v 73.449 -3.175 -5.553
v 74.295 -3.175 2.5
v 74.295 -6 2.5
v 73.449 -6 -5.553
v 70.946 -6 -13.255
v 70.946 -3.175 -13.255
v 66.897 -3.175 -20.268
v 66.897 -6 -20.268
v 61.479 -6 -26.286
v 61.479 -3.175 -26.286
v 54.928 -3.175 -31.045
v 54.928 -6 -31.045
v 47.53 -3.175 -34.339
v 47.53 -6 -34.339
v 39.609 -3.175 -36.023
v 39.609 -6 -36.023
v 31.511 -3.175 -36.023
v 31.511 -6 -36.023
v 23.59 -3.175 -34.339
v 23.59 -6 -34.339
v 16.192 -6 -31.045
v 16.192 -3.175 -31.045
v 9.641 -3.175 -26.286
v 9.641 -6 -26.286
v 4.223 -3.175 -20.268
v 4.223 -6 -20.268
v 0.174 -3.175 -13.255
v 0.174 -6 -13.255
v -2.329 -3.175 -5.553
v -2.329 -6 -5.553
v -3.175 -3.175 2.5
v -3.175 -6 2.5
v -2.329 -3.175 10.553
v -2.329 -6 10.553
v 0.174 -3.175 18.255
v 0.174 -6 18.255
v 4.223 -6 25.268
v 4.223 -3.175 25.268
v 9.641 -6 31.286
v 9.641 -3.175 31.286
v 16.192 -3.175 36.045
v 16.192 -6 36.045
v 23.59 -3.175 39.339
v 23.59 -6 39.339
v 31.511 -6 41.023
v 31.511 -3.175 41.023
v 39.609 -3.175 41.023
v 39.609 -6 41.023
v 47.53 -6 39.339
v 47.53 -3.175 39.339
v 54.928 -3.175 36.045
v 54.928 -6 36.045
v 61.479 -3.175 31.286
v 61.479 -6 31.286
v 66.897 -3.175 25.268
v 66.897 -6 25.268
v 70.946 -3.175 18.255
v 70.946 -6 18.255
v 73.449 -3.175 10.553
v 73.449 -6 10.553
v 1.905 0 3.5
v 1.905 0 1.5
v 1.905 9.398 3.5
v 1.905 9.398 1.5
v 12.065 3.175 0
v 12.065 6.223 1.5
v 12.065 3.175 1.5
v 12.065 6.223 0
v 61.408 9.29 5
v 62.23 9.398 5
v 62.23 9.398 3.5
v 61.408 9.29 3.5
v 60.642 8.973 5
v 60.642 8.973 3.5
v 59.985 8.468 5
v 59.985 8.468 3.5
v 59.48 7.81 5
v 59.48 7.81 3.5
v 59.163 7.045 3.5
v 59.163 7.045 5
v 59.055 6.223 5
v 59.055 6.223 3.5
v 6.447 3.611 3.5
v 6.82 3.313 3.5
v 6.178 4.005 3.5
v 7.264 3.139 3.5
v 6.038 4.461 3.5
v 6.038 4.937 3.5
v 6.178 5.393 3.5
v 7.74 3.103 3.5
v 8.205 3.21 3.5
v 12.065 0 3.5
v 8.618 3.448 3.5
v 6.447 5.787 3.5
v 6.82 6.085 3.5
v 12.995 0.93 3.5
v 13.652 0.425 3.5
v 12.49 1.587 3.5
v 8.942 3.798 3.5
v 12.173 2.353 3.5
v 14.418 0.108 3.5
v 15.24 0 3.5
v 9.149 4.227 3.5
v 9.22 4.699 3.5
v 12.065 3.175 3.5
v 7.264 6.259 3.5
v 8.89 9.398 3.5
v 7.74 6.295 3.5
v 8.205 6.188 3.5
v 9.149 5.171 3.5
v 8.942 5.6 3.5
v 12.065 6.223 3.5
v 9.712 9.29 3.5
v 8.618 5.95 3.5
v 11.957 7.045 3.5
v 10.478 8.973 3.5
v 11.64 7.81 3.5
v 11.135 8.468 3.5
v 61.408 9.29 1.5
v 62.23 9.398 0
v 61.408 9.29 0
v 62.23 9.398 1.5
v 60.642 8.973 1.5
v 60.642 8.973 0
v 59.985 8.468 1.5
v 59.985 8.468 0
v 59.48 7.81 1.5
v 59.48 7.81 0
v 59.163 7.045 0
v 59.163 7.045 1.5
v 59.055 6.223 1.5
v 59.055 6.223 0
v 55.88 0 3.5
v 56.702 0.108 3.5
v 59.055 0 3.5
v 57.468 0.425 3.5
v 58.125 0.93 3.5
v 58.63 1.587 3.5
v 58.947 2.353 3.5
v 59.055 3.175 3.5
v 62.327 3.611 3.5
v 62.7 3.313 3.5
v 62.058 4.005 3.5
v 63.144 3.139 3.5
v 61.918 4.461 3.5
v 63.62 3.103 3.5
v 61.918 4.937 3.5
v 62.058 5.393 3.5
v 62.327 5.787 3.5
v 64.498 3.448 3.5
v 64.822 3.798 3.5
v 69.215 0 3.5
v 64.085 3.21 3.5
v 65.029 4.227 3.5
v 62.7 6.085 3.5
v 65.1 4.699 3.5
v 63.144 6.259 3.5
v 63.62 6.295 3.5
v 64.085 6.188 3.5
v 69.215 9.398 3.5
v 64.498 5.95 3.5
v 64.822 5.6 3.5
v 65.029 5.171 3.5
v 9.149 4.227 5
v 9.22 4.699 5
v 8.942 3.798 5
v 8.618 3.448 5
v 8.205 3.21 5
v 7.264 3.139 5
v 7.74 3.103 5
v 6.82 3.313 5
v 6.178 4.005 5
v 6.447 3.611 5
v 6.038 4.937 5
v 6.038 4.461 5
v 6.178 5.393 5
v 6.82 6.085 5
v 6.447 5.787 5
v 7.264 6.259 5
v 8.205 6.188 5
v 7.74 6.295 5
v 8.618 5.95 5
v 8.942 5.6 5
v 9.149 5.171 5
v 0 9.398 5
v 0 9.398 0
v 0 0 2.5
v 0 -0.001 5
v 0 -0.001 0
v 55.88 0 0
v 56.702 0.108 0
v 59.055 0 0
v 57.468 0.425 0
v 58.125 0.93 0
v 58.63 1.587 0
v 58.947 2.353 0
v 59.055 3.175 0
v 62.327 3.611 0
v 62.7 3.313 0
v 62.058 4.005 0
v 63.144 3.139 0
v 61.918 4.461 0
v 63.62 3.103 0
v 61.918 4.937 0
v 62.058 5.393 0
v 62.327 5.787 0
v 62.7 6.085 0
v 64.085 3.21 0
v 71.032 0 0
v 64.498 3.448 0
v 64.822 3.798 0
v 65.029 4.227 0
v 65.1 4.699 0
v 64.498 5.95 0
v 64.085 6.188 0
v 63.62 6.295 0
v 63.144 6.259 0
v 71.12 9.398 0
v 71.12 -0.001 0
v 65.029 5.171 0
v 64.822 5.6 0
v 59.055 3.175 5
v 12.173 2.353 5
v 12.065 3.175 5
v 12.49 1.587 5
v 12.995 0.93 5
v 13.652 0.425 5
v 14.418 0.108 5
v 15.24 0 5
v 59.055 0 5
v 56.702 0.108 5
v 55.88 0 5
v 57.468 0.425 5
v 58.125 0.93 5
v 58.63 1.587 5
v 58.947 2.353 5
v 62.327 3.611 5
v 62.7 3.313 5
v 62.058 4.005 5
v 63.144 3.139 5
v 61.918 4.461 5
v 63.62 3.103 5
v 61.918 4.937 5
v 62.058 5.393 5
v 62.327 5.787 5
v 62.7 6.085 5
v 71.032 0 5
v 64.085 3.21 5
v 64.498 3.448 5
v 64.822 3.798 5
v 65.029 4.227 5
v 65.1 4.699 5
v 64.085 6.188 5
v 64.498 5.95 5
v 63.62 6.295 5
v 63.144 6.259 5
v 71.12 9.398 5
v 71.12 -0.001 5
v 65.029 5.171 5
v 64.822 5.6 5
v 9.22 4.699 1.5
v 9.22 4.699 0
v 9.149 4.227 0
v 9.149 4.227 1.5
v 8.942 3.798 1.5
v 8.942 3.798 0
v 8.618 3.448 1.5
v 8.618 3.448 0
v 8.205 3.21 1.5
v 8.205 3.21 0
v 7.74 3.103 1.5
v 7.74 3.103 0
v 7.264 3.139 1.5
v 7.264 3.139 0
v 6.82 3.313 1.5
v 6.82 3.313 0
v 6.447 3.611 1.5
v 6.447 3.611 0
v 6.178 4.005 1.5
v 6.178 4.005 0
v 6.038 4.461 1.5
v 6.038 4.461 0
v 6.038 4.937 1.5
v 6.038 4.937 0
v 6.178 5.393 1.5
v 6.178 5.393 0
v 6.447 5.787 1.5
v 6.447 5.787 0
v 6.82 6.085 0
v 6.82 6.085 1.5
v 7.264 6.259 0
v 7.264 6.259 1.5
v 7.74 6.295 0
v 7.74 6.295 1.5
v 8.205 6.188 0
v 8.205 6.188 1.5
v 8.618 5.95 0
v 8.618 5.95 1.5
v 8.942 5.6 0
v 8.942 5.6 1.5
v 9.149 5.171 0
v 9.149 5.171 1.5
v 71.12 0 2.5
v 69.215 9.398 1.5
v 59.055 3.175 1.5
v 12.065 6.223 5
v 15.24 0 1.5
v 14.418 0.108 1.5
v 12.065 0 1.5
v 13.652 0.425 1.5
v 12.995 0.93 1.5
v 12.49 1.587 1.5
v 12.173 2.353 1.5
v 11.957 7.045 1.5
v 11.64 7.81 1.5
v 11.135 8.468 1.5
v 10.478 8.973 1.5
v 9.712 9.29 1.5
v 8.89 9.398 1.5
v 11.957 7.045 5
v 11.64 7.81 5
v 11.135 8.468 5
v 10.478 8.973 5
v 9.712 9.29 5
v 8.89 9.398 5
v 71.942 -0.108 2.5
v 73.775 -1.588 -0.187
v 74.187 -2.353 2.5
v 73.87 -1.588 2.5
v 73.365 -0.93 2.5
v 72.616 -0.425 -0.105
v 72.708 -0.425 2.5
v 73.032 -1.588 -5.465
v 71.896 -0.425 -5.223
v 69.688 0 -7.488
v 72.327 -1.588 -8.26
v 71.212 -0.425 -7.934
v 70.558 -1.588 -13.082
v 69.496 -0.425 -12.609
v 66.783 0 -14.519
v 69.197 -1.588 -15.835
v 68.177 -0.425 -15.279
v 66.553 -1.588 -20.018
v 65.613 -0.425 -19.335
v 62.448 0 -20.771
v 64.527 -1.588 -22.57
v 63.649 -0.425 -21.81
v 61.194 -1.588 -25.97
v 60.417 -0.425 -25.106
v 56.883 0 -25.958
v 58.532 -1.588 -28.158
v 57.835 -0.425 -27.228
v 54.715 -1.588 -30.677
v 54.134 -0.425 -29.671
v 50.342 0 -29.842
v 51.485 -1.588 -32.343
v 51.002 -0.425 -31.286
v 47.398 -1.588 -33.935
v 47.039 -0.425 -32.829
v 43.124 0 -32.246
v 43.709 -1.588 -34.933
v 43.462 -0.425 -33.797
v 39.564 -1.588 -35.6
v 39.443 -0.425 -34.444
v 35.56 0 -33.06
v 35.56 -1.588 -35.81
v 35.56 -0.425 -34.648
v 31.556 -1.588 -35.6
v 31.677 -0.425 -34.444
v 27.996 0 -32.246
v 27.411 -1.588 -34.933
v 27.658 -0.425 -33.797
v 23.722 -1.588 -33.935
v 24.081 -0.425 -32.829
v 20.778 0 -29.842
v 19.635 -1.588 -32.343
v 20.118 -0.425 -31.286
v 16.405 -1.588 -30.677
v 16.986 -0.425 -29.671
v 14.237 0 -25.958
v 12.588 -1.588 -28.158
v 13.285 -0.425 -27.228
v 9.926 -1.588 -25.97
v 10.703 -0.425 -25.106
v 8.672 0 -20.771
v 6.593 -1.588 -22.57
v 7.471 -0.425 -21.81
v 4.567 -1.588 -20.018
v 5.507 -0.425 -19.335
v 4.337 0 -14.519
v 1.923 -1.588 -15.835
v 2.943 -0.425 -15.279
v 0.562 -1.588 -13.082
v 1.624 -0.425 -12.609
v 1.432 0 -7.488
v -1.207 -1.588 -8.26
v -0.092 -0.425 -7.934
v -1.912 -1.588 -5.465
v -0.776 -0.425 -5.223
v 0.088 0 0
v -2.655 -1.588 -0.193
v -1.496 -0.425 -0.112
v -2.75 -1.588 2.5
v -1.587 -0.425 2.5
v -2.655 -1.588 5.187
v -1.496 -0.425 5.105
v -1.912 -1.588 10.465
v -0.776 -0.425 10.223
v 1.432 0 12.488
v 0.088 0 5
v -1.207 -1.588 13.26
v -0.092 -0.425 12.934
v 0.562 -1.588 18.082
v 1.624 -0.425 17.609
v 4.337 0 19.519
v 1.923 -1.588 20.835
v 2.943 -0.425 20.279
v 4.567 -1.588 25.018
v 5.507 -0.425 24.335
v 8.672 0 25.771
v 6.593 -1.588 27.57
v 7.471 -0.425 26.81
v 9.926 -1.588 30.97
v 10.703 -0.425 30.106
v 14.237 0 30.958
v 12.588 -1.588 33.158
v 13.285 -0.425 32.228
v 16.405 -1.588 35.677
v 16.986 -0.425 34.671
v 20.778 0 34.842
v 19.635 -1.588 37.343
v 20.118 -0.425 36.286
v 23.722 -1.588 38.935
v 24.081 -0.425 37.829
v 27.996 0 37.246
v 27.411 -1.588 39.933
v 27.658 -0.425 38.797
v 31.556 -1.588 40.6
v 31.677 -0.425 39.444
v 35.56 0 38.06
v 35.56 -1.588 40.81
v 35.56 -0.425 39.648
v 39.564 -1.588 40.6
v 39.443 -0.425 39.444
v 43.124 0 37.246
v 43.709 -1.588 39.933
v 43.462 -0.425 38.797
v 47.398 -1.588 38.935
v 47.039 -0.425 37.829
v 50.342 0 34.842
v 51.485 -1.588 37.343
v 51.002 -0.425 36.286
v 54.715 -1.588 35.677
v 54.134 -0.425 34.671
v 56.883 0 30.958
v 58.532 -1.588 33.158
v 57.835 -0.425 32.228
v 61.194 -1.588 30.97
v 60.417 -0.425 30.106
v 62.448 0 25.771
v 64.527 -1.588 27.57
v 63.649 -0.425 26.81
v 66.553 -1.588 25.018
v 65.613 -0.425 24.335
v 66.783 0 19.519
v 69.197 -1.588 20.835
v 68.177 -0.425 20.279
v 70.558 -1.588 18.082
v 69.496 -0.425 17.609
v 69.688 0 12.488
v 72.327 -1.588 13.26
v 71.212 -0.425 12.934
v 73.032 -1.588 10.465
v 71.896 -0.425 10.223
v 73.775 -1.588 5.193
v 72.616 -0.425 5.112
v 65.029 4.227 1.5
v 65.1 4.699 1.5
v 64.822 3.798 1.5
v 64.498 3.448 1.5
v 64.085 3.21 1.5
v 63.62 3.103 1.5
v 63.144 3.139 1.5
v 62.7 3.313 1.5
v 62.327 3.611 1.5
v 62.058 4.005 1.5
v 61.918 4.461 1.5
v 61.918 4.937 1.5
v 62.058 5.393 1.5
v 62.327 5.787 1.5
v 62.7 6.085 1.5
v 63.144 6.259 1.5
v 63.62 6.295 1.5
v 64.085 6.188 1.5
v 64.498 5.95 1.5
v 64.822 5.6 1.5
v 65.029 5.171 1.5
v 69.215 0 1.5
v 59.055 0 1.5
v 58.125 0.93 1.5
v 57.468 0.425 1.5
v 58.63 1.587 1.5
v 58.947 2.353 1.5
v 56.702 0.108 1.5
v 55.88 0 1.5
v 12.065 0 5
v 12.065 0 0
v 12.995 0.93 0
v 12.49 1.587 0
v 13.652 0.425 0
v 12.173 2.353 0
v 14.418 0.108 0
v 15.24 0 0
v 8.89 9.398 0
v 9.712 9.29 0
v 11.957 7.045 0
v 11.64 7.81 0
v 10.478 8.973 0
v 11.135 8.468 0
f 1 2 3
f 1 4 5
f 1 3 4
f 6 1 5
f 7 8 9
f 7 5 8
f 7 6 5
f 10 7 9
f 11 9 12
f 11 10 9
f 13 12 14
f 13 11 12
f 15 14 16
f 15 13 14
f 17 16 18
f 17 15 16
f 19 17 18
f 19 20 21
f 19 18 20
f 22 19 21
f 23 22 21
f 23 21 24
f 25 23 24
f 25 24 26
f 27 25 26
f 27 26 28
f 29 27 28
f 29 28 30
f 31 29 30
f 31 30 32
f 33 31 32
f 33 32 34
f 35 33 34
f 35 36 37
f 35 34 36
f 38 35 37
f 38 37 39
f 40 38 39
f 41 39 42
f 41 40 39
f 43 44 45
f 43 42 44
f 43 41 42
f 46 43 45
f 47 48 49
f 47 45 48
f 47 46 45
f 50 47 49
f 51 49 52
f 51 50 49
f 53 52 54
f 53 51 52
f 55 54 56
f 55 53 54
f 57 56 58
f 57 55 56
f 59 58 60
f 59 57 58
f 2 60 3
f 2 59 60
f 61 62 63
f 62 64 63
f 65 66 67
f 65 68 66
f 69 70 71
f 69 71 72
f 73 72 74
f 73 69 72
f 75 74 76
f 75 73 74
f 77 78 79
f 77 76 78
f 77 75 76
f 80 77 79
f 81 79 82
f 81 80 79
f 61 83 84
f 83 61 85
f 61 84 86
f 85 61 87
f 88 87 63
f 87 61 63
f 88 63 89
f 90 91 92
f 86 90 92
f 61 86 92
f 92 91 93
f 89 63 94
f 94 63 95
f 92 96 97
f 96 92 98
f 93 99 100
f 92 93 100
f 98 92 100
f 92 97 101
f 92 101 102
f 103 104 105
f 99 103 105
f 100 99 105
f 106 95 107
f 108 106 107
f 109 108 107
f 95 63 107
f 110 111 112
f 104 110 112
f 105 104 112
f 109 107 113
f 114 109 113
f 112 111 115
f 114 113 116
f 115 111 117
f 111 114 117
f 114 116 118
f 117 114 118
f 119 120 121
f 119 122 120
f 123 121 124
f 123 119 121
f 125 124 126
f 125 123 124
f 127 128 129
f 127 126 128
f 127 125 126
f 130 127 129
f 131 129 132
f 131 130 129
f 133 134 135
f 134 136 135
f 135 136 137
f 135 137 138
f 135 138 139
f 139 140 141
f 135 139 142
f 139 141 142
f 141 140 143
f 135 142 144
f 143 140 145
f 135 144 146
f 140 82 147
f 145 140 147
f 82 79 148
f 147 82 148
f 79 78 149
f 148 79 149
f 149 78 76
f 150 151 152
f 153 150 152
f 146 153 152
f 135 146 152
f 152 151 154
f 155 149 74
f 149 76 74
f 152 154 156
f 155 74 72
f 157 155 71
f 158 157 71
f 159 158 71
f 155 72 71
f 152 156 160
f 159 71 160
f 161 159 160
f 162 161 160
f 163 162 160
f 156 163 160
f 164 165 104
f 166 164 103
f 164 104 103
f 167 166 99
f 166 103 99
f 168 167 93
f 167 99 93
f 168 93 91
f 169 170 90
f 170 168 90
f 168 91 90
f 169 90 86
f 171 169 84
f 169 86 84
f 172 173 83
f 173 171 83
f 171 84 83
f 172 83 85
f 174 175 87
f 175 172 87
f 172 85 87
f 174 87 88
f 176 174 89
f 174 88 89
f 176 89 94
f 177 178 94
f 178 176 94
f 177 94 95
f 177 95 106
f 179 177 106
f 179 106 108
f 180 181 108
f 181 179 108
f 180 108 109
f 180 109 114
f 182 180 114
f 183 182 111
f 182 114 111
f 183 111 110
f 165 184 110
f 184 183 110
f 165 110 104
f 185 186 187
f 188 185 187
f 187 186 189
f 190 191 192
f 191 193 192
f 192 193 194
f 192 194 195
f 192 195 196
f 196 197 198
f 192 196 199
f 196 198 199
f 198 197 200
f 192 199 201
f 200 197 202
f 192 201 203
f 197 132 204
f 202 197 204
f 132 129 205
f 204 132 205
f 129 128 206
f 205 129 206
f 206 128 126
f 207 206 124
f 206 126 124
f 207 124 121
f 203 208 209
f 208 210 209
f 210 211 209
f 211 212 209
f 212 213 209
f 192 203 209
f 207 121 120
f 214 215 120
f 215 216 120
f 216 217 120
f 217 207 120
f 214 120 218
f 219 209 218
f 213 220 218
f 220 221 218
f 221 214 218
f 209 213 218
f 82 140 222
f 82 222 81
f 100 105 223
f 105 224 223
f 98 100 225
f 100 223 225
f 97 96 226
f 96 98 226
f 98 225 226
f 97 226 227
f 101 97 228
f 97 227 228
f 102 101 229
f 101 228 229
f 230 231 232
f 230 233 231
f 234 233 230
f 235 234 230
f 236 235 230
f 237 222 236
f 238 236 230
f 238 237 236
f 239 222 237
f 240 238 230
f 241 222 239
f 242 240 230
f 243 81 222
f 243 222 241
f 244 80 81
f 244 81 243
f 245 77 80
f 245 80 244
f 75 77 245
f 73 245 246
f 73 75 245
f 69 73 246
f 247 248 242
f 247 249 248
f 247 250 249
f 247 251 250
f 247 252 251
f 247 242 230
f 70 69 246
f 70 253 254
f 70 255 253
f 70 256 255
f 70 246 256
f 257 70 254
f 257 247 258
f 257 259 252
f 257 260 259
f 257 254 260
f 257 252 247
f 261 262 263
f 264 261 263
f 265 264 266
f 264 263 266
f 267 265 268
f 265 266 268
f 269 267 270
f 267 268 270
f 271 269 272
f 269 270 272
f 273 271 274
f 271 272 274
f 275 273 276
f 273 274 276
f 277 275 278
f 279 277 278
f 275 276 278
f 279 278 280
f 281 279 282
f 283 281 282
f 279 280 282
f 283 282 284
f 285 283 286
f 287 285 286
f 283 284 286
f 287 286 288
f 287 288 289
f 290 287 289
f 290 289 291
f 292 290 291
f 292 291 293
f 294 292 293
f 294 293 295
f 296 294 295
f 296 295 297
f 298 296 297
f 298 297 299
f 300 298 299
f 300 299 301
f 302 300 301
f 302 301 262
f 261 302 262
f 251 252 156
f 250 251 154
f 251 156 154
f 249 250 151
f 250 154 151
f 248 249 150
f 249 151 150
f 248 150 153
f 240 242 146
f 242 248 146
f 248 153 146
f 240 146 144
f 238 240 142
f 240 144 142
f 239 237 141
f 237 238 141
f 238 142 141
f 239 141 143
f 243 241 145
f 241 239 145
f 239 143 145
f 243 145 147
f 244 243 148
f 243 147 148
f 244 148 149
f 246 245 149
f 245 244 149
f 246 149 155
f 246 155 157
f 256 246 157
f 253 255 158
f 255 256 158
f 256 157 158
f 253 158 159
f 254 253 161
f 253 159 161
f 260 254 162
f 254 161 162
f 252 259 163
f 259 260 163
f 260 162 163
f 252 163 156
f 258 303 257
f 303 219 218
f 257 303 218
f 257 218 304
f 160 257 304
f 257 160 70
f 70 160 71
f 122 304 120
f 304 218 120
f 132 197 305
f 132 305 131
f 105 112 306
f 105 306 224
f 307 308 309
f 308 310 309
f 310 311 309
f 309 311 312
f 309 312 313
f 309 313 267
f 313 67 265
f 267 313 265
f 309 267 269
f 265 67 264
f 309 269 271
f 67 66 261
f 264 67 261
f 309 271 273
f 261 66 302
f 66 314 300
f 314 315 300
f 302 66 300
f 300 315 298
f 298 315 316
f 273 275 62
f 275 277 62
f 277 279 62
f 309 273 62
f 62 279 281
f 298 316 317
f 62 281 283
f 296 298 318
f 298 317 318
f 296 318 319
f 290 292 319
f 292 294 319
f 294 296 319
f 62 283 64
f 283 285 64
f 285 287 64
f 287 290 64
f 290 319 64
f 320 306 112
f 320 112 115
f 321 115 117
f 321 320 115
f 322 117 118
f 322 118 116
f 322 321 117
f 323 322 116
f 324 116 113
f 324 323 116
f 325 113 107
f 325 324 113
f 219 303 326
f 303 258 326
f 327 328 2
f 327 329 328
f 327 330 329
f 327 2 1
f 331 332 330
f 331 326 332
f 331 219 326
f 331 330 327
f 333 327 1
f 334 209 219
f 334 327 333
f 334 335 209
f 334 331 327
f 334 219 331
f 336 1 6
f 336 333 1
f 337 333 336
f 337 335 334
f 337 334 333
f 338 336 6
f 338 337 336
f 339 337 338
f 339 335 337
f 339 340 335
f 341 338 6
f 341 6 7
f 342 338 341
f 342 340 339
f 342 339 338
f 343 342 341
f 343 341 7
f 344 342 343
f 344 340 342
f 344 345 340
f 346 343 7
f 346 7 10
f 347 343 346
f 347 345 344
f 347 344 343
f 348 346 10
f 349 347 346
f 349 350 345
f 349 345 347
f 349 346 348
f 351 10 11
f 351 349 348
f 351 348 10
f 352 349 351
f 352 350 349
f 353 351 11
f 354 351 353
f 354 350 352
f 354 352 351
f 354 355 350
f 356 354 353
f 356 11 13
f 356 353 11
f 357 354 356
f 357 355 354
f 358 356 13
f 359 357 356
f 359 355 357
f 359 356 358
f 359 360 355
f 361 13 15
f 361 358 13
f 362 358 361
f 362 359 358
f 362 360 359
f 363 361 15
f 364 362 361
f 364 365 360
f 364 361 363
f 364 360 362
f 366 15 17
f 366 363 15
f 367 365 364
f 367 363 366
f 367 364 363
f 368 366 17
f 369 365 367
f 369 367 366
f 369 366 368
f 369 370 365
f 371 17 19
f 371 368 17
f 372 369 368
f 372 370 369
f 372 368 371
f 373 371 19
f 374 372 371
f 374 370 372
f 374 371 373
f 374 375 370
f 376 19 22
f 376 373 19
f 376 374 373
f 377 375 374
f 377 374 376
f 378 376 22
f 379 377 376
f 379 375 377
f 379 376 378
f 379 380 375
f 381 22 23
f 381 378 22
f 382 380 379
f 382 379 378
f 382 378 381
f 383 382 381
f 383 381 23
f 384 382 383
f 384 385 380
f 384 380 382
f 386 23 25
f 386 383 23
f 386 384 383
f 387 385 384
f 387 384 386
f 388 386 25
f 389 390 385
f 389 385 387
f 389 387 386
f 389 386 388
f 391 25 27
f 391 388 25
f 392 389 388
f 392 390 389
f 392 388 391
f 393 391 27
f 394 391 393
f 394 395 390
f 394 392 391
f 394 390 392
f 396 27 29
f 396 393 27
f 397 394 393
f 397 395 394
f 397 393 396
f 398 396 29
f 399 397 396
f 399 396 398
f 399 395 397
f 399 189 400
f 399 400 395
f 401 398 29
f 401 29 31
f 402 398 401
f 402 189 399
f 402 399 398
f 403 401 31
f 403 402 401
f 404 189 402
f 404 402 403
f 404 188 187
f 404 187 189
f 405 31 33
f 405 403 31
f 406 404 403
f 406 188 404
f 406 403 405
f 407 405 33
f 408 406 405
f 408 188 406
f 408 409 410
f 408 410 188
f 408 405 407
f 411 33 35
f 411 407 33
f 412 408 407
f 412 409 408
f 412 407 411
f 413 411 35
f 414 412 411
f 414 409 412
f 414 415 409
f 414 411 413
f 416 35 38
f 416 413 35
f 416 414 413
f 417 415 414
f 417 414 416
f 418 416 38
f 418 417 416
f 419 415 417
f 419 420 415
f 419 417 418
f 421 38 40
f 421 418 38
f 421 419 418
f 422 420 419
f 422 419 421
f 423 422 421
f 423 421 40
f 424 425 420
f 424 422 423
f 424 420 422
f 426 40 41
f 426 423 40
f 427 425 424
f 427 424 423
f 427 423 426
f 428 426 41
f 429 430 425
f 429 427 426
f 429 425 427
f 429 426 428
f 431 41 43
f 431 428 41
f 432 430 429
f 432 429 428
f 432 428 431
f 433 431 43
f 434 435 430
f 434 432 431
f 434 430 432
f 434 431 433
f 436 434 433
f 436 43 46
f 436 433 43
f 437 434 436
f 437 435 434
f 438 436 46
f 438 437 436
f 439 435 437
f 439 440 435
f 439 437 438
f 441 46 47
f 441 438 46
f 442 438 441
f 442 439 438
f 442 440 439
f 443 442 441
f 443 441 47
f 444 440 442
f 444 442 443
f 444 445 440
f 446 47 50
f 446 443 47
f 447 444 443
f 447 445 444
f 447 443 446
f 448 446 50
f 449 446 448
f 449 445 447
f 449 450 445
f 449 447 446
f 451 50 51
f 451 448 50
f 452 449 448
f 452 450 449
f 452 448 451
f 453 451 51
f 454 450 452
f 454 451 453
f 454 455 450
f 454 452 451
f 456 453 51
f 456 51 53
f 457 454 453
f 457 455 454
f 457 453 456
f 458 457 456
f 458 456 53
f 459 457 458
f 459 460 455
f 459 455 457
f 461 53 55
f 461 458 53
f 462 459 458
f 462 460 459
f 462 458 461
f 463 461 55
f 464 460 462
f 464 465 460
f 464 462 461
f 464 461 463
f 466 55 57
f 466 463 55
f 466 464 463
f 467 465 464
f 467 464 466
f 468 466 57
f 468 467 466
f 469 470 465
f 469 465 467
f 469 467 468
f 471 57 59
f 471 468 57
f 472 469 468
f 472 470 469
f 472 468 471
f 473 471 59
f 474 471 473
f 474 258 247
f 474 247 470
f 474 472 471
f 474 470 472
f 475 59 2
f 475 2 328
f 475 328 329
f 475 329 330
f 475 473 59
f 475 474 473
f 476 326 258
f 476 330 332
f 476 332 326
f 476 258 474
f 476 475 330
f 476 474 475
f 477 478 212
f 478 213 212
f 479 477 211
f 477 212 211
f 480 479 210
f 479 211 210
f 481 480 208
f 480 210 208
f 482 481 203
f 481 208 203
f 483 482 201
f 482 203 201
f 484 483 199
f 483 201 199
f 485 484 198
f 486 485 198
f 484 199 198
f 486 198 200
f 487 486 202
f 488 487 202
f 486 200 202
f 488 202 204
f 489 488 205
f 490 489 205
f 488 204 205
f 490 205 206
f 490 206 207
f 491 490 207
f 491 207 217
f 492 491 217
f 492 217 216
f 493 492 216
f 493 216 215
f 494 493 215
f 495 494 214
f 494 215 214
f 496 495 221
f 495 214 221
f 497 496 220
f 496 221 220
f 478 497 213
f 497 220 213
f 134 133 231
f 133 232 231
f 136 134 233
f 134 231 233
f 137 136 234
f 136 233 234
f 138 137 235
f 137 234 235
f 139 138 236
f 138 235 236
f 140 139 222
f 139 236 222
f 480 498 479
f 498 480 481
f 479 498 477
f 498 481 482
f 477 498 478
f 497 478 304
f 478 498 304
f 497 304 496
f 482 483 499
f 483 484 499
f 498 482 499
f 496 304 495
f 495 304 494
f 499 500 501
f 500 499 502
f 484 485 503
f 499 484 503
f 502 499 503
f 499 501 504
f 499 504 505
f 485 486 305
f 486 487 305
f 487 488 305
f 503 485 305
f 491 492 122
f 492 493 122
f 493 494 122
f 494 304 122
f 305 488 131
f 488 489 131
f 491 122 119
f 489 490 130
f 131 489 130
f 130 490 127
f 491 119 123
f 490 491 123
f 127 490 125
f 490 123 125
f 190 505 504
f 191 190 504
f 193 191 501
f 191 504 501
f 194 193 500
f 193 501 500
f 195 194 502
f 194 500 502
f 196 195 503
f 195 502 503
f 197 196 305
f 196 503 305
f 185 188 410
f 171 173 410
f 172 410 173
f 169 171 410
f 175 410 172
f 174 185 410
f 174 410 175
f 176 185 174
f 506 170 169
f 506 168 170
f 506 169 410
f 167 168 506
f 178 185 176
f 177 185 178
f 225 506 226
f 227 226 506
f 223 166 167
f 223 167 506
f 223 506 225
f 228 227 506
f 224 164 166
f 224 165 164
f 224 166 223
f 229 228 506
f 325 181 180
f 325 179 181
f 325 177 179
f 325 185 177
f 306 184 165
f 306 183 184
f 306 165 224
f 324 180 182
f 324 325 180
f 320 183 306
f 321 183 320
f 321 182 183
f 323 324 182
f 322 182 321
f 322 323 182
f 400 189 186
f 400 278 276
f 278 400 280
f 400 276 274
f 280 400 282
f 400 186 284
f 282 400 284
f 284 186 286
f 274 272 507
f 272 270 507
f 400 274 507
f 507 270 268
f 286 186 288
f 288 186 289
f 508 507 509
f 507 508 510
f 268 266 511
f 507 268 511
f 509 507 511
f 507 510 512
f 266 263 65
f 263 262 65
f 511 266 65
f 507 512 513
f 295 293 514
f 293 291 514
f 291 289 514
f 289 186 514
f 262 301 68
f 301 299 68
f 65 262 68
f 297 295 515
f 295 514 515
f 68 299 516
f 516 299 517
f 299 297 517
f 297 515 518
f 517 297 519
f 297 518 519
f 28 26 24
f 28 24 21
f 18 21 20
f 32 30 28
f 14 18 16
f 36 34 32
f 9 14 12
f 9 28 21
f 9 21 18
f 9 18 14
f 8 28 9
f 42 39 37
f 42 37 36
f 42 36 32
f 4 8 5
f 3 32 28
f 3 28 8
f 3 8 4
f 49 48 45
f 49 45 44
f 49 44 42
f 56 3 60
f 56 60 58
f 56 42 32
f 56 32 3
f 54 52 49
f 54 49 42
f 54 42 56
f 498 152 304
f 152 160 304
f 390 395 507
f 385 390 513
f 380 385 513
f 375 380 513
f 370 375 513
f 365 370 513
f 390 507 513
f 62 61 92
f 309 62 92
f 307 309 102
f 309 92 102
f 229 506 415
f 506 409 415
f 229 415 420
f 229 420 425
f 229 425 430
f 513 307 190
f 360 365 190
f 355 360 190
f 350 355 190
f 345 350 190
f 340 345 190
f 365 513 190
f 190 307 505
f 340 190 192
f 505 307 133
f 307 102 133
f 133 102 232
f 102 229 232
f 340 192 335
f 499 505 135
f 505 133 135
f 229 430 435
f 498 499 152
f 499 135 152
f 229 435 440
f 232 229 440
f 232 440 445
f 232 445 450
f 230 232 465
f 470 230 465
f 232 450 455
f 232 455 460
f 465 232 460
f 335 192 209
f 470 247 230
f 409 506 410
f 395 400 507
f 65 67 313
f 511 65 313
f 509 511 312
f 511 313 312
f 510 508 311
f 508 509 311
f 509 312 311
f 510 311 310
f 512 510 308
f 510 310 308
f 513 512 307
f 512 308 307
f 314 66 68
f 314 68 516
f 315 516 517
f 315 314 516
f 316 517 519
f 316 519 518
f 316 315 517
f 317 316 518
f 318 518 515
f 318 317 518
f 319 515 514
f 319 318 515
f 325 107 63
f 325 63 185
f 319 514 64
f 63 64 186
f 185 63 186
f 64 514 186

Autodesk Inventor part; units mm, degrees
ref_plane "YZ Plane" through (0, 0, 0) normal (1, 0, 0) x (0, 1, 0)
ref_plane "XZ Plane" through (0, 0, 0) normal (0, 1, 0) x (-1, 0, 0)
ref_plane "XY Plane" through (0, 0, 0) normal (0, 0, 1) x (1, 0, 0)
sketch "Sketch1" plane through (0, 0, 0) normal (0, 0, 1) x (1, 0, 0)
  line L0 (0, 0) -> (12.065, 0)
  line L1 (71.12, 0) -> (71.12, 9.398)
  line L2 (71.12, 9.398) -> (59.055, 9.398)
  line L3 (0, 9.398) -> (0, 0)
  circle A0 centre (7.62, 4.699) radius 1.6
  circle A1 centre (63.5, 4.699) radius 1.6
  line L4 (63.5, 4.699) -> (7.62, 4.699) construction
  line L5 (12.065, 9.398) -> (12.065, 0)
  line L6 (59.055, 0) -> (59.055, 9.398)
  line L7 (59.055, 9.398) -> (12.065, 9.398) construction
  line L8 (12.065, 9.398) -> (0, 9.398)
  line L9 (12.065, 0) -> (59.055, 0) construction
  line L10 (59.055, 0) -> (71.12, 0)
  line L11 (1.905, 9.398) -> (7.62, 4.699) construction
  line L12 (1.905, 0) -> (7.62, 4.699) construction
  line L13 (63.5, 4.699) -> (69.215, 9.398) construction
  line L14 (69.215, 0) -> (63.5, 4.699) construction
  line L15 (1.905, 0) -> (1.905, 9.398) construction
  line L16 (69.215, 0) -> (69.215, 9.398) construction
  line L17 (1.905, 0) -> (0, 9.398) construction
  line L18 (69.215, 0) -> (71.12, 9.398) construction
  dimension "d0" = 3.2
  dimension "d1" = 55.88
  dimension "d2" = 71.12
  dimension "d3" = 9.398
  dimension "d5" = 67.31
  dimension "d6" = 10.16
extrude "Extrusion1" add sketch "Sketch1" along normal blind 5
sketch "Sketch2" plane through (0, 0, 0) normal (0, -1, 0) x (1, 0, 0)
  circle A0 centre (35.56, 2.5) radius 38.735
  line L0 (0, 0) -> (12.065, 0) construction
  line L1 (12.065, 0) -> (12.065, 5) construction
  line L2 (0, 5) -> (12.065, 5) construction
  line L3 (0, 0) -> (0, 5) construction
  line L4 (71.12, 0) -> (59.055, 0) construction
  line L5 (71.12, 0) -> (71.12, 5) construction
  line L6 (59.055, 5) -> (71.12, 5) construction
  line L7 (59.055, 0) -> (59.055, 5) construction
  line L8 (12.065, 5) -> (35.56, 2.5) construction
  line L9 (71.12, 5) -> (59.055, 5) projected
  line L10 (35.56, 2.5) -> (59.055, 5) construction
  line L11 (59.055, 0) -> (71.12, 0) projected
  line L12 (59.055, 0) -> (35.56, 2.5) construction
  dimension "d9" = 77.47
extrude "Extrusion2" add sketch "Sketch2" along normal blind 6
sketch "Sketch3" plane through (0, 9.398, 0) normal (0, 1, 0) x (1, 0, 0)
  line L0 (1.905, -3.5) -> (69.215, -3.5)
  line L1 (69.215, -3.5) -> (69.215, -1.5)
  line L2 (69.215, -1.5) -> (1.905, -1.5)
  line L3 (1.905, -1.5) -> (1.905, -3.5)
  line L4 (71.12, 0) -> (59.055, 0) construction
  line L5 (69.215, -1.5) -> (71.12, 0) construction
  line L6 (71.0194, -5.1196) -> (69.215, -3.5) construction
  line L7 (0, 0) -> (0, -5) construction
  line L8 (0, -5) -> (1.905, -3.5) construction
  line L9 (1.905, -1.5) -> (0, 0) construction
  dimension "d12" = 67.31
  dimension "d13" = 2
extrude "Extrusion3" cut sketch "Sketch3" against normal up to surface (9.398 mm away)
fillet "Fillet1" radius 3.175 1 edges at (-3.175, 0, 2.5)
fillet "Fillet2" radius 3.175 8 edges at (12.065, 9.398, 4.25) (12.065, 9.398, 0.75) (12.065, 0, 4.25) (12.065, 0, 0.75) (59.055, 0, 0.75) (59.055, 9.398, 0.75) (59.055, 9.398, 4.25) (59.055, 0, 4.25)
properties part number "Base"
